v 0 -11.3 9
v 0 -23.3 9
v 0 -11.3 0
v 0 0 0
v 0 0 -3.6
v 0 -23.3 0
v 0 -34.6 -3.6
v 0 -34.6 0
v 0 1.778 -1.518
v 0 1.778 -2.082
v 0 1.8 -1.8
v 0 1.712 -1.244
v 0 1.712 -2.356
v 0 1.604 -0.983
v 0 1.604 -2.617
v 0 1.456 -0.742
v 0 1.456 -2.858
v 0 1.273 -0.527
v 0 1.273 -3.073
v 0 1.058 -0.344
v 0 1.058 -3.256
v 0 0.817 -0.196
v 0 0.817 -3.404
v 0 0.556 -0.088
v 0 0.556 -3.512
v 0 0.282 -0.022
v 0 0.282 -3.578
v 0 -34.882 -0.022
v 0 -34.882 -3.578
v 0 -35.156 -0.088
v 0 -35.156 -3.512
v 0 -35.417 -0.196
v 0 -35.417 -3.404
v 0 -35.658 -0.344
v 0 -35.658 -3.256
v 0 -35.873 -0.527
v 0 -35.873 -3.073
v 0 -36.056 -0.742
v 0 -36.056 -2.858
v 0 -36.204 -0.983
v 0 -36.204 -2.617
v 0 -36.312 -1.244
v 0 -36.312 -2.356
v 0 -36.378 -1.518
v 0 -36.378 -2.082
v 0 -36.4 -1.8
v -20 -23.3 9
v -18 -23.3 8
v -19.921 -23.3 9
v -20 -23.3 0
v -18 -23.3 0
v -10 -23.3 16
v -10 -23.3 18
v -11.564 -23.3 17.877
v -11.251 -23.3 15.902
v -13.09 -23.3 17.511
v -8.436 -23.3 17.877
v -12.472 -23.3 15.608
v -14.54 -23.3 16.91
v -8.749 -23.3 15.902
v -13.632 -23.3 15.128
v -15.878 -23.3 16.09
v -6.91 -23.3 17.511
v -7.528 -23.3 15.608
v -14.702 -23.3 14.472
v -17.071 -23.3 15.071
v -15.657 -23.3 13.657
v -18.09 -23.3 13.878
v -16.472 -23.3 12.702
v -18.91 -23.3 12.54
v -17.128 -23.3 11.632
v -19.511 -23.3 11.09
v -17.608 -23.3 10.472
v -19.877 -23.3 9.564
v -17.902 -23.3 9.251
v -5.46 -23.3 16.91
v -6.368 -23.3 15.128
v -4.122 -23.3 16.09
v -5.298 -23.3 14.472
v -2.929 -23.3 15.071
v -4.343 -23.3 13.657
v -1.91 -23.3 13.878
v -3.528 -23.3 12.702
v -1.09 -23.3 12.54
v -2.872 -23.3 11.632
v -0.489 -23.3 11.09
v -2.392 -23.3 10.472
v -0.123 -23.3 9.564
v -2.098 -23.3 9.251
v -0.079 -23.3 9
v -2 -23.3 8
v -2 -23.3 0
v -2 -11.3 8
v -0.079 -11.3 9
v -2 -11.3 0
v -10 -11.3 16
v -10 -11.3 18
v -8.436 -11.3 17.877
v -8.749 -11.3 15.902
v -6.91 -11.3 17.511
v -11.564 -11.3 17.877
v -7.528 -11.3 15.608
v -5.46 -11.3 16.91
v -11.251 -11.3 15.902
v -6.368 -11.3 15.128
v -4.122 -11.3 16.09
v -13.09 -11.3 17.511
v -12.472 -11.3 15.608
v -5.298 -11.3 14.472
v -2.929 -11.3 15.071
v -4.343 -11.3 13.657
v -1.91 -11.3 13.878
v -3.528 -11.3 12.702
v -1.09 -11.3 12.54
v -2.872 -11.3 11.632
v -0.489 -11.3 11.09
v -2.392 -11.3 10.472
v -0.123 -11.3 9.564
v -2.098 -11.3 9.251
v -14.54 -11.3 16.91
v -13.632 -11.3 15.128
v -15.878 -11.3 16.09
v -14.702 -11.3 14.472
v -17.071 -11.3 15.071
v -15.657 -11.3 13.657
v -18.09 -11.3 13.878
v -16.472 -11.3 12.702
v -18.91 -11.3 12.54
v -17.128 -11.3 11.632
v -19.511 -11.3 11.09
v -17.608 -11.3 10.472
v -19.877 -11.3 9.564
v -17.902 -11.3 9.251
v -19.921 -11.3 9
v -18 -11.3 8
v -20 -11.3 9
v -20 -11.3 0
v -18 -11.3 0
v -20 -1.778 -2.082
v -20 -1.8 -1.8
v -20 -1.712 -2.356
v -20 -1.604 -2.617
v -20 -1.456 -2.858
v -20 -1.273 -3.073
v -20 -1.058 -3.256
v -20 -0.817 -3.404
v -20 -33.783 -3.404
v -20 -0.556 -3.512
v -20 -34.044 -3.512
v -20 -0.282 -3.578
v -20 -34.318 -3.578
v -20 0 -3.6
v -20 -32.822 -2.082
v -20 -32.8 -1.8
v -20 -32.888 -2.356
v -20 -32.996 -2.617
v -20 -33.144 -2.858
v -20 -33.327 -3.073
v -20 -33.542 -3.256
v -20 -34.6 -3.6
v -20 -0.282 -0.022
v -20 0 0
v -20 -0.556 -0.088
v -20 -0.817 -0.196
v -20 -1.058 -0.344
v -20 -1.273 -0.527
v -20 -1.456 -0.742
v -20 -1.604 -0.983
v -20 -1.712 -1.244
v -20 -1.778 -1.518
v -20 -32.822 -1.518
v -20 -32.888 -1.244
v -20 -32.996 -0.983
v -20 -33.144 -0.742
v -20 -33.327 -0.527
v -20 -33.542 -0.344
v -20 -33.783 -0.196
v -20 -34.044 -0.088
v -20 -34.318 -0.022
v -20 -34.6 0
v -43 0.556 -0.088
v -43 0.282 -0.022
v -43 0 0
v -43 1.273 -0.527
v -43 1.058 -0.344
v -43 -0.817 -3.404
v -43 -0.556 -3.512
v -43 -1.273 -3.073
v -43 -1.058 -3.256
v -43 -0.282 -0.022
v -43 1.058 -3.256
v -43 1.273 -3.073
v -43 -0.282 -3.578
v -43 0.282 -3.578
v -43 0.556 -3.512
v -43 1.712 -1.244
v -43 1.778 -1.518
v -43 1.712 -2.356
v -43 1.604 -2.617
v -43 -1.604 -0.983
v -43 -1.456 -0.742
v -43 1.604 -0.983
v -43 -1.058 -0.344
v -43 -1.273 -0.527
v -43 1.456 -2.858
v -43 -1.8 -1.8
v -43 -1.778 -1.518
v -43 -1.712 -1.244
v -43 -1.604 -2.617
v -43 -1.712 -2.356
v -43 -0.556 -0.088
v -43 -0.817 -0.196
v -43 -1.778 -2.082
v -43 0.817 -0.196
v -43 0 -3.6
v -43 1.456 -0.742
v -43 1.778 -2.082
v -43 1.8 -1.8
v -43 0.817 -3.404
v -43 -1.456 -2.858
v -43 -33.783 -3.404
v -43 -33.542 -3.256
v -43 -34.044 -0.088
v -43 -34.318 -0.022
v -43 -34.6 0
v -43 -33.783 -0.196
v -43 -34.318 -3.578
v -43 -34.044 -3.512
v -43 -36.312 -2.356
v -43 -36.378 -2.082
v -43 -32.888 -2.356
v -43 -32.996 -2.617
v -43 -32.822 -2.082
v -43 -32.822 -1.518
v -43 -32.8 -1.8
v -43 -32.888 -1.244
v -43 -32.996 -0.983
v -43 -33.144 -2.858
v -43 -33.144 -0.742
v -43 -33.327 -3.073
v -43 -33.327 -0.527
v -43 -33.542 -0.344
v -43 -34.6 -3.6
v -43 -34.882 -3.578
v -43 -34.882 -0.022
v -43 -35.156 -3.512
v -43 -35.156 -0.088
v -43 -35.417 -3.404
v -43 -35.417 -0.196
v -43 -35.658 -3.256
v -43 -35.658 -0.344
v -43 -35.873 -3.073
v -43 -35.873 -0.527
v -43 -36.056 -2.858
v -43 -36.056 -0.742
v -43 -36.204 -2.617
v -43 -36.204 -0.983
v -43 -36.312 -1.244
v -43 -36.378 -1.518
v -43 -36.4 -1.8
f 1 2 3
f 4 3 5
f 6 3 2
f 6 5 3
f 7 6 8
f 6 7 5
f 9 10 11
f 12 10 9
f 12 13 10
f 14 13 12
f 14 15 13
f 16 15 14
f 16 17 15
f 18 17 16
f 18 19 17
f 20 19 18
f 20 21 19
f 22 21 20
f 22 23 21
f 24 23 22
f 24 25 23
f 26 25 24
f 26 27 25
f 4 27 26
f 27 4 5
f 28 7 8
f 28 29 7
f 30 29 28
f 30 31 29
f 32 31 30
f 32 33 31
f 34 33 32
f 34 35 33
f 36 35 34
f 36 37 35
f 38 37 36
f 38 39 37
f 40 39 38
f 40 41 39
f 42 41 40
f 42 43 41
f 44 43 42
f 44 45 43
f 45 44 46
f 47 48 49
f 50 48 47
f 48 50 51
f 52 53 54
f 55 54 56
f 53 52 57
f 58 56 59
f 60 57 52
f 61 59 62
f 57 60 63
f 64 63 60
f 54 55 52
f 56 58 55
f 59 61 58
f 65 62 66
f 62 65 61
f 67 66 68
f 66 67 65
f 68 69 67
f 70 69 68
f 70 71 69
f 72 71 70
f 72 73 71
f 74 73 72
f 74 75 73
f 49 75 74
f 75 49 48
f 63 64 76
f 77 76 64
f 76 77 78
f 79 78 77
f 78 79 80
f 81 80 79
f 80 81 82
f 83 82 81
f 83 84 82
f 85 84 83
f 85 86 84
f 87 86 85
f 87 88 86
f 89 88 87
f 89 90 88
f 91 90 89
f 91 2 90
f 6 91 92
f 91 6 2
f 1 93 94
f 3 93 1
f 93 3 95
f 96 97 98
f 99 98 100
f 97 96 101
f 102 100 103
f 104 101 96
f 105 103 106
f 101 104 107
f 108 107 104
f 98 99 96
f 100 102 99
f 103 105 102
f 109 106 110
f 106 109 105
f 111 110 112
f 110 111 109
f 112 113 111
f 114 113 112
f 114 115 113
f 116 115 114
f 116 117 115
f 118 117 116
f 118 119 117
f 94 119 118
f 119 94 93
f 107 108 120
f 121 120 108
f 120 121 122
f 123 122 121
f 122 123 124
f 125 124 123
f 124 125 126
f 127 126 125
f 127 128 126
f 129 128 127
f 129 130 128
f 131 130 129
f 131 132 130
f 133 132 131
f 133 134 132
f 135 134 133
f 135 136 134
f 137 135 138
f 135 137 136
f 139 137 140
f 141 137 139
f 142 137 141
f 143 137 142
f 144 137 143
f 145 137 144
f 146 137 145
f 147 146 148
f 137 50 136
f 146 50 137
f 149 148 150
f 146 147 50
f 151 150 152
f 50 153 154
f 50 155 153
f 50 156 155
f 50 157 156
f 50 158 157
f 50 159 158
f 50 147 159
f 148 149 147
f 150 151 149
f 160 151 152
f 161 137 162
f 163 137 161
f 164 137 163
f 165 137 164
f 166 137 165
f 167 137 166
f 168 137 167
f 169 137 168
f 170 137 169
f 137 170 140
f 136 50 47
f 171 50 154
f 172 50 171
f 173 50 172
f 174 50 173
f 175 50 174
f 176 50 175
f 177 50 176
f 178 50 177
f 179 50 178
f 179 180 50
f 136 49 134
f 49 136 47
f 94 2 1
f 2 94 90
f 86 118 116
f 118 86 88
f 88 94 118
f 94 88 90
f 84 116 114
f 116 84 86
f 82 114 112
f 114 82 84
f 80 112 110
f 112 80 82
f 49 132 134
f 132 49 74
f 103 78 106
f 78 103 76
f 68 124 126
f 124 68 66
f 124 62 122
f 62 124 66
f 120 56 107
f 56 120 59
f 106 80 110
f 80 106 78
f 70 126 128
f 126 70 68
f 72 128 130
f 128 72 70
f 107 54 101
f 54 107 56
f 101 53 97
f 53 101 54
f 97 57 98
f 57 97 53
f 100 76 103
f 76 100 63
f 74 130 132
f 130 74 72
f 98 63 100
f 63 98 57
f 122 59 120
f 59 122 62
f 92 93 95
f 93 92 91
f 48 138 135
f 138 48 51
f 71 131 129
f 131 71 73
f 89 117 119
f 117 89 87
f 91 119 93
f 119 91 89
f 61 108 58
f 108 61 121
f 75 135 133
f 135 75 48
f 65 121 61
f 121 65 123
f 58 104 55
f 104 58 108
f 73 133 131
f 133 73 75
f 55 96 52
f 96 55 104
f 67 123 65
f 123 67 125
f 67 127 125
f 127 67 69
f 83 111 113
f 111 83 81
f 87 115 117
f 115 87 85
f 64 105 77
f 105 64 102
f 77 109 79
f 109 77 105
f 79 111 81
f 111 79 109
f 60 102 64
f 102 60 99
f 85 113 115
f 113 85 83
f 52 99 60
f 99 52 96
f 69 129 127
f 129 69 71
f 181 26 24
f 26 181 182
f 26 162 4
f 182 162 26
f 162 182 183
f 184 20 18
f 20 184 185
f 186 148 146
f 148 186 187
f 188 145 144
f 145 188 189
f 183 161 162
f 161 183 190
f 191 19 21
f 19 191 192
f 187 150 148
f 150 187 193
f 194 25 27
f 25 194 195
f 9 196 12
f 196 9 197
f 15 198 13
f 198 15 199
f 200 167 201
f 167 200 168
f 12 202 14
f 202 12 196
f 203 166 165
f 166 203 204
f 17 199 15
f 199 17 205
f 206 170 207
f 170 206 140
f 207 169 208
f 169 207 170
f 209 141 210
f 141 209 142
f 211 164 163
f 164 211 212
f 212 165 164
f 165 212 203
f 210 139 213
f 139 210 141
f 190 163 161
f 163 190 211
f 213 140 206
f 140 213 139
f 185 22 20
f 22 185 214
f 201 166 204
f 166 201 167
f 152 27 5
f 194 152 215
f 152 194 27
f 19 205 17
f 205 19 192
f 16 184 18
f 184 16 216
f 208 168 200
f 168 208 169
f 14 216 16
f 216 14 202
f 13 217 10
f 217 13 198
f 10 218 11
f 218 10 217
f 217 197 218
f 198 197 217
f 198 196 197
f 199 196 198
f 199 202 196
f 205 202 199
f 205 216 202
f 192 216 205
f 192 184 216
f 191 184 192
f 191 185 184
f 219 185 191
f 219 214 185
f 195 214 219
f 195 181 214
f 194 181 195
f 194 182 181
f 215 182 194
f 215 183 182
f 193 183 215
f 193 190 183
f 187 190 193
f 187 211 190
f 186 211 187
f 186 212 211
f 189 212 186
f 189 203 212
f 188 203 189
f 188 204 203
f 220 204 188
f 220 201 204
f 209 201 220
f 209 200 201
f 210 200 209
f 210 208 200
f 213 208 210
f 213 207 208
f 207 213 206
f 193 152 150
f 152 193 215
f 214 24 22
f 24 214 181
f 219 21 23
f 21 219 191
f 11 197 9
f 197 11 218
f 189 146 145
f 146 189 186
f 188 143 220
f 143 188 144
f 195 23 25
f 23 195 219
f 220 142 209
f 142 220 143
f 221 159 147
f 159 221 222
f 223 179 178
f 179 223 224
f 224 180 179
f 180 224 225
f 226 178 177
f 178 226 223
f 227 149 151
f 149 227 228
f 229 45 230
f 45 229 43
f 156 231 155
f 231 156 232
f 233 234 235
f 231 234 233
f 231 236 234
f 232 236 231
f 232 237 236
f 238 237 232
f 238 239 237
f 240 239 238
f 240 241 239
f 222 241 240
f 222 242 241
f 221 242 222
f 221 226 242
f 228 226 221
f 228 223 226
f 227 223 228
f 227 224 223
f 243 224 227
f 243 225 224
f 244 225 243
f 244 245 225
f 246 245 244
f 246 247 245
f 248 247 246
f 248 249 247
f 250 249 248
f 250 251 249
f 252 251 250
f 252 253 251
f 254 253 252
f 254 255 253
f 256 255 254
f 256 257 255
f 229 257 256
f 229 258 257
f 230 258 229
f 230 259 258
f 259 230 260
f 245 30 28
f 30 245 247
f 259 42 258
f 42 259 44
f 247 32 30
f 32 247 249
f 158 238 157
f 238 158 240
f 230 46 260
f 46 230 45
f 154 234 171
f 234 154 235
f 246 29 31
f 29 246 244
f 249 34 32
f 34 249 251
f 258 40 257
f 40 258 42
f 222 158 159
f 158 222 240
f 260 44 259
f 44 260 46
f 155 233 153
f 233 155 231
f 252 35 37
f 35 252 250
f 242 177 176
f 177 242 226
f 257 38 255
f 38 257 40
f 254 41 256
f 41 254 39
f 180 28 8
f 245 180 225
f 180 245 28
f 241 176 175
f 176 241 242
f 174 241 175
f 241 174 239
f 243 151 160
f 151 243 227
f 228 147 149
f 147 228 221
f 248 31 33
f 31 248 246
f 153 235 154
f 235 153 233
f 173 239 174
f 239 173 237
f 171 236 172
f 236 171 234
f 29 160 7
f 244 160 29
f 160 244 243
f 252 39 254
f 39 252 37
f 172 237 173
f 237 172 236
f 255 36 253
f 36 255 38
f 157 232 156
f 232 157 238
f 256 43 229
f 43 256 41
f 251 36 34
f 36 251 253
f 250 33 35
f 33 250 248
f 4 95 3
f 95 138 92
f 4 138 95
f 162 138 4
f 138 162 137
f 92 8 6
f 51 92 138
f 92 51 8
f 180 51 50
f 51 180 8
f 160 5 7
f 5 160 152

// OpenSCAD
/*[holder plate]*/
//stick distance mm
hsd=34.6;
//stick length mm
hsl=25; 
//stick radius mm
hsr=1.8; 

/*[holder ring]*/
//width mm (min 10)
rw=16; 
//heigth mm
rh=12; 
//thickness mm
t=2; 
//elements of the arc
$fn=40;

rotate([90,0,0]) {
    //holder ring
    translate([-rw/2-t,rw/2,hsd/2]) {
        difference() {
            //outside
            union() {
                translate([0,-rw/4,0])
                cube([rw+2*t,(rw+2*t)/2,rh],center=true);
                cylinder(rh,rw/2+t,rw/2+t,center=true);
            }
            //cutout
            union() {
                translate([0,-rw/2,0])
                cube([rw,rw,rh*2],center=true);
                cylinder(rh*2,rw/2,rw/2,center=true);
            }
        }
    }

    //holder plate
    translate([-(rw+2*t),-hsr*2,0]) {
        cube([rw+2*t,hsr*2,hsd]);
    }
    //holder sticks
    translate([0,-hsr,0]) {
        rotate([270,0,90]) {
            cylinder(hsl+rw+t,hsr,hsr);
            translate([0,-hsd,0]) {
                cylinder(hsl+rw+t,hsr,hsr);
            }
        }
    }
    
}
